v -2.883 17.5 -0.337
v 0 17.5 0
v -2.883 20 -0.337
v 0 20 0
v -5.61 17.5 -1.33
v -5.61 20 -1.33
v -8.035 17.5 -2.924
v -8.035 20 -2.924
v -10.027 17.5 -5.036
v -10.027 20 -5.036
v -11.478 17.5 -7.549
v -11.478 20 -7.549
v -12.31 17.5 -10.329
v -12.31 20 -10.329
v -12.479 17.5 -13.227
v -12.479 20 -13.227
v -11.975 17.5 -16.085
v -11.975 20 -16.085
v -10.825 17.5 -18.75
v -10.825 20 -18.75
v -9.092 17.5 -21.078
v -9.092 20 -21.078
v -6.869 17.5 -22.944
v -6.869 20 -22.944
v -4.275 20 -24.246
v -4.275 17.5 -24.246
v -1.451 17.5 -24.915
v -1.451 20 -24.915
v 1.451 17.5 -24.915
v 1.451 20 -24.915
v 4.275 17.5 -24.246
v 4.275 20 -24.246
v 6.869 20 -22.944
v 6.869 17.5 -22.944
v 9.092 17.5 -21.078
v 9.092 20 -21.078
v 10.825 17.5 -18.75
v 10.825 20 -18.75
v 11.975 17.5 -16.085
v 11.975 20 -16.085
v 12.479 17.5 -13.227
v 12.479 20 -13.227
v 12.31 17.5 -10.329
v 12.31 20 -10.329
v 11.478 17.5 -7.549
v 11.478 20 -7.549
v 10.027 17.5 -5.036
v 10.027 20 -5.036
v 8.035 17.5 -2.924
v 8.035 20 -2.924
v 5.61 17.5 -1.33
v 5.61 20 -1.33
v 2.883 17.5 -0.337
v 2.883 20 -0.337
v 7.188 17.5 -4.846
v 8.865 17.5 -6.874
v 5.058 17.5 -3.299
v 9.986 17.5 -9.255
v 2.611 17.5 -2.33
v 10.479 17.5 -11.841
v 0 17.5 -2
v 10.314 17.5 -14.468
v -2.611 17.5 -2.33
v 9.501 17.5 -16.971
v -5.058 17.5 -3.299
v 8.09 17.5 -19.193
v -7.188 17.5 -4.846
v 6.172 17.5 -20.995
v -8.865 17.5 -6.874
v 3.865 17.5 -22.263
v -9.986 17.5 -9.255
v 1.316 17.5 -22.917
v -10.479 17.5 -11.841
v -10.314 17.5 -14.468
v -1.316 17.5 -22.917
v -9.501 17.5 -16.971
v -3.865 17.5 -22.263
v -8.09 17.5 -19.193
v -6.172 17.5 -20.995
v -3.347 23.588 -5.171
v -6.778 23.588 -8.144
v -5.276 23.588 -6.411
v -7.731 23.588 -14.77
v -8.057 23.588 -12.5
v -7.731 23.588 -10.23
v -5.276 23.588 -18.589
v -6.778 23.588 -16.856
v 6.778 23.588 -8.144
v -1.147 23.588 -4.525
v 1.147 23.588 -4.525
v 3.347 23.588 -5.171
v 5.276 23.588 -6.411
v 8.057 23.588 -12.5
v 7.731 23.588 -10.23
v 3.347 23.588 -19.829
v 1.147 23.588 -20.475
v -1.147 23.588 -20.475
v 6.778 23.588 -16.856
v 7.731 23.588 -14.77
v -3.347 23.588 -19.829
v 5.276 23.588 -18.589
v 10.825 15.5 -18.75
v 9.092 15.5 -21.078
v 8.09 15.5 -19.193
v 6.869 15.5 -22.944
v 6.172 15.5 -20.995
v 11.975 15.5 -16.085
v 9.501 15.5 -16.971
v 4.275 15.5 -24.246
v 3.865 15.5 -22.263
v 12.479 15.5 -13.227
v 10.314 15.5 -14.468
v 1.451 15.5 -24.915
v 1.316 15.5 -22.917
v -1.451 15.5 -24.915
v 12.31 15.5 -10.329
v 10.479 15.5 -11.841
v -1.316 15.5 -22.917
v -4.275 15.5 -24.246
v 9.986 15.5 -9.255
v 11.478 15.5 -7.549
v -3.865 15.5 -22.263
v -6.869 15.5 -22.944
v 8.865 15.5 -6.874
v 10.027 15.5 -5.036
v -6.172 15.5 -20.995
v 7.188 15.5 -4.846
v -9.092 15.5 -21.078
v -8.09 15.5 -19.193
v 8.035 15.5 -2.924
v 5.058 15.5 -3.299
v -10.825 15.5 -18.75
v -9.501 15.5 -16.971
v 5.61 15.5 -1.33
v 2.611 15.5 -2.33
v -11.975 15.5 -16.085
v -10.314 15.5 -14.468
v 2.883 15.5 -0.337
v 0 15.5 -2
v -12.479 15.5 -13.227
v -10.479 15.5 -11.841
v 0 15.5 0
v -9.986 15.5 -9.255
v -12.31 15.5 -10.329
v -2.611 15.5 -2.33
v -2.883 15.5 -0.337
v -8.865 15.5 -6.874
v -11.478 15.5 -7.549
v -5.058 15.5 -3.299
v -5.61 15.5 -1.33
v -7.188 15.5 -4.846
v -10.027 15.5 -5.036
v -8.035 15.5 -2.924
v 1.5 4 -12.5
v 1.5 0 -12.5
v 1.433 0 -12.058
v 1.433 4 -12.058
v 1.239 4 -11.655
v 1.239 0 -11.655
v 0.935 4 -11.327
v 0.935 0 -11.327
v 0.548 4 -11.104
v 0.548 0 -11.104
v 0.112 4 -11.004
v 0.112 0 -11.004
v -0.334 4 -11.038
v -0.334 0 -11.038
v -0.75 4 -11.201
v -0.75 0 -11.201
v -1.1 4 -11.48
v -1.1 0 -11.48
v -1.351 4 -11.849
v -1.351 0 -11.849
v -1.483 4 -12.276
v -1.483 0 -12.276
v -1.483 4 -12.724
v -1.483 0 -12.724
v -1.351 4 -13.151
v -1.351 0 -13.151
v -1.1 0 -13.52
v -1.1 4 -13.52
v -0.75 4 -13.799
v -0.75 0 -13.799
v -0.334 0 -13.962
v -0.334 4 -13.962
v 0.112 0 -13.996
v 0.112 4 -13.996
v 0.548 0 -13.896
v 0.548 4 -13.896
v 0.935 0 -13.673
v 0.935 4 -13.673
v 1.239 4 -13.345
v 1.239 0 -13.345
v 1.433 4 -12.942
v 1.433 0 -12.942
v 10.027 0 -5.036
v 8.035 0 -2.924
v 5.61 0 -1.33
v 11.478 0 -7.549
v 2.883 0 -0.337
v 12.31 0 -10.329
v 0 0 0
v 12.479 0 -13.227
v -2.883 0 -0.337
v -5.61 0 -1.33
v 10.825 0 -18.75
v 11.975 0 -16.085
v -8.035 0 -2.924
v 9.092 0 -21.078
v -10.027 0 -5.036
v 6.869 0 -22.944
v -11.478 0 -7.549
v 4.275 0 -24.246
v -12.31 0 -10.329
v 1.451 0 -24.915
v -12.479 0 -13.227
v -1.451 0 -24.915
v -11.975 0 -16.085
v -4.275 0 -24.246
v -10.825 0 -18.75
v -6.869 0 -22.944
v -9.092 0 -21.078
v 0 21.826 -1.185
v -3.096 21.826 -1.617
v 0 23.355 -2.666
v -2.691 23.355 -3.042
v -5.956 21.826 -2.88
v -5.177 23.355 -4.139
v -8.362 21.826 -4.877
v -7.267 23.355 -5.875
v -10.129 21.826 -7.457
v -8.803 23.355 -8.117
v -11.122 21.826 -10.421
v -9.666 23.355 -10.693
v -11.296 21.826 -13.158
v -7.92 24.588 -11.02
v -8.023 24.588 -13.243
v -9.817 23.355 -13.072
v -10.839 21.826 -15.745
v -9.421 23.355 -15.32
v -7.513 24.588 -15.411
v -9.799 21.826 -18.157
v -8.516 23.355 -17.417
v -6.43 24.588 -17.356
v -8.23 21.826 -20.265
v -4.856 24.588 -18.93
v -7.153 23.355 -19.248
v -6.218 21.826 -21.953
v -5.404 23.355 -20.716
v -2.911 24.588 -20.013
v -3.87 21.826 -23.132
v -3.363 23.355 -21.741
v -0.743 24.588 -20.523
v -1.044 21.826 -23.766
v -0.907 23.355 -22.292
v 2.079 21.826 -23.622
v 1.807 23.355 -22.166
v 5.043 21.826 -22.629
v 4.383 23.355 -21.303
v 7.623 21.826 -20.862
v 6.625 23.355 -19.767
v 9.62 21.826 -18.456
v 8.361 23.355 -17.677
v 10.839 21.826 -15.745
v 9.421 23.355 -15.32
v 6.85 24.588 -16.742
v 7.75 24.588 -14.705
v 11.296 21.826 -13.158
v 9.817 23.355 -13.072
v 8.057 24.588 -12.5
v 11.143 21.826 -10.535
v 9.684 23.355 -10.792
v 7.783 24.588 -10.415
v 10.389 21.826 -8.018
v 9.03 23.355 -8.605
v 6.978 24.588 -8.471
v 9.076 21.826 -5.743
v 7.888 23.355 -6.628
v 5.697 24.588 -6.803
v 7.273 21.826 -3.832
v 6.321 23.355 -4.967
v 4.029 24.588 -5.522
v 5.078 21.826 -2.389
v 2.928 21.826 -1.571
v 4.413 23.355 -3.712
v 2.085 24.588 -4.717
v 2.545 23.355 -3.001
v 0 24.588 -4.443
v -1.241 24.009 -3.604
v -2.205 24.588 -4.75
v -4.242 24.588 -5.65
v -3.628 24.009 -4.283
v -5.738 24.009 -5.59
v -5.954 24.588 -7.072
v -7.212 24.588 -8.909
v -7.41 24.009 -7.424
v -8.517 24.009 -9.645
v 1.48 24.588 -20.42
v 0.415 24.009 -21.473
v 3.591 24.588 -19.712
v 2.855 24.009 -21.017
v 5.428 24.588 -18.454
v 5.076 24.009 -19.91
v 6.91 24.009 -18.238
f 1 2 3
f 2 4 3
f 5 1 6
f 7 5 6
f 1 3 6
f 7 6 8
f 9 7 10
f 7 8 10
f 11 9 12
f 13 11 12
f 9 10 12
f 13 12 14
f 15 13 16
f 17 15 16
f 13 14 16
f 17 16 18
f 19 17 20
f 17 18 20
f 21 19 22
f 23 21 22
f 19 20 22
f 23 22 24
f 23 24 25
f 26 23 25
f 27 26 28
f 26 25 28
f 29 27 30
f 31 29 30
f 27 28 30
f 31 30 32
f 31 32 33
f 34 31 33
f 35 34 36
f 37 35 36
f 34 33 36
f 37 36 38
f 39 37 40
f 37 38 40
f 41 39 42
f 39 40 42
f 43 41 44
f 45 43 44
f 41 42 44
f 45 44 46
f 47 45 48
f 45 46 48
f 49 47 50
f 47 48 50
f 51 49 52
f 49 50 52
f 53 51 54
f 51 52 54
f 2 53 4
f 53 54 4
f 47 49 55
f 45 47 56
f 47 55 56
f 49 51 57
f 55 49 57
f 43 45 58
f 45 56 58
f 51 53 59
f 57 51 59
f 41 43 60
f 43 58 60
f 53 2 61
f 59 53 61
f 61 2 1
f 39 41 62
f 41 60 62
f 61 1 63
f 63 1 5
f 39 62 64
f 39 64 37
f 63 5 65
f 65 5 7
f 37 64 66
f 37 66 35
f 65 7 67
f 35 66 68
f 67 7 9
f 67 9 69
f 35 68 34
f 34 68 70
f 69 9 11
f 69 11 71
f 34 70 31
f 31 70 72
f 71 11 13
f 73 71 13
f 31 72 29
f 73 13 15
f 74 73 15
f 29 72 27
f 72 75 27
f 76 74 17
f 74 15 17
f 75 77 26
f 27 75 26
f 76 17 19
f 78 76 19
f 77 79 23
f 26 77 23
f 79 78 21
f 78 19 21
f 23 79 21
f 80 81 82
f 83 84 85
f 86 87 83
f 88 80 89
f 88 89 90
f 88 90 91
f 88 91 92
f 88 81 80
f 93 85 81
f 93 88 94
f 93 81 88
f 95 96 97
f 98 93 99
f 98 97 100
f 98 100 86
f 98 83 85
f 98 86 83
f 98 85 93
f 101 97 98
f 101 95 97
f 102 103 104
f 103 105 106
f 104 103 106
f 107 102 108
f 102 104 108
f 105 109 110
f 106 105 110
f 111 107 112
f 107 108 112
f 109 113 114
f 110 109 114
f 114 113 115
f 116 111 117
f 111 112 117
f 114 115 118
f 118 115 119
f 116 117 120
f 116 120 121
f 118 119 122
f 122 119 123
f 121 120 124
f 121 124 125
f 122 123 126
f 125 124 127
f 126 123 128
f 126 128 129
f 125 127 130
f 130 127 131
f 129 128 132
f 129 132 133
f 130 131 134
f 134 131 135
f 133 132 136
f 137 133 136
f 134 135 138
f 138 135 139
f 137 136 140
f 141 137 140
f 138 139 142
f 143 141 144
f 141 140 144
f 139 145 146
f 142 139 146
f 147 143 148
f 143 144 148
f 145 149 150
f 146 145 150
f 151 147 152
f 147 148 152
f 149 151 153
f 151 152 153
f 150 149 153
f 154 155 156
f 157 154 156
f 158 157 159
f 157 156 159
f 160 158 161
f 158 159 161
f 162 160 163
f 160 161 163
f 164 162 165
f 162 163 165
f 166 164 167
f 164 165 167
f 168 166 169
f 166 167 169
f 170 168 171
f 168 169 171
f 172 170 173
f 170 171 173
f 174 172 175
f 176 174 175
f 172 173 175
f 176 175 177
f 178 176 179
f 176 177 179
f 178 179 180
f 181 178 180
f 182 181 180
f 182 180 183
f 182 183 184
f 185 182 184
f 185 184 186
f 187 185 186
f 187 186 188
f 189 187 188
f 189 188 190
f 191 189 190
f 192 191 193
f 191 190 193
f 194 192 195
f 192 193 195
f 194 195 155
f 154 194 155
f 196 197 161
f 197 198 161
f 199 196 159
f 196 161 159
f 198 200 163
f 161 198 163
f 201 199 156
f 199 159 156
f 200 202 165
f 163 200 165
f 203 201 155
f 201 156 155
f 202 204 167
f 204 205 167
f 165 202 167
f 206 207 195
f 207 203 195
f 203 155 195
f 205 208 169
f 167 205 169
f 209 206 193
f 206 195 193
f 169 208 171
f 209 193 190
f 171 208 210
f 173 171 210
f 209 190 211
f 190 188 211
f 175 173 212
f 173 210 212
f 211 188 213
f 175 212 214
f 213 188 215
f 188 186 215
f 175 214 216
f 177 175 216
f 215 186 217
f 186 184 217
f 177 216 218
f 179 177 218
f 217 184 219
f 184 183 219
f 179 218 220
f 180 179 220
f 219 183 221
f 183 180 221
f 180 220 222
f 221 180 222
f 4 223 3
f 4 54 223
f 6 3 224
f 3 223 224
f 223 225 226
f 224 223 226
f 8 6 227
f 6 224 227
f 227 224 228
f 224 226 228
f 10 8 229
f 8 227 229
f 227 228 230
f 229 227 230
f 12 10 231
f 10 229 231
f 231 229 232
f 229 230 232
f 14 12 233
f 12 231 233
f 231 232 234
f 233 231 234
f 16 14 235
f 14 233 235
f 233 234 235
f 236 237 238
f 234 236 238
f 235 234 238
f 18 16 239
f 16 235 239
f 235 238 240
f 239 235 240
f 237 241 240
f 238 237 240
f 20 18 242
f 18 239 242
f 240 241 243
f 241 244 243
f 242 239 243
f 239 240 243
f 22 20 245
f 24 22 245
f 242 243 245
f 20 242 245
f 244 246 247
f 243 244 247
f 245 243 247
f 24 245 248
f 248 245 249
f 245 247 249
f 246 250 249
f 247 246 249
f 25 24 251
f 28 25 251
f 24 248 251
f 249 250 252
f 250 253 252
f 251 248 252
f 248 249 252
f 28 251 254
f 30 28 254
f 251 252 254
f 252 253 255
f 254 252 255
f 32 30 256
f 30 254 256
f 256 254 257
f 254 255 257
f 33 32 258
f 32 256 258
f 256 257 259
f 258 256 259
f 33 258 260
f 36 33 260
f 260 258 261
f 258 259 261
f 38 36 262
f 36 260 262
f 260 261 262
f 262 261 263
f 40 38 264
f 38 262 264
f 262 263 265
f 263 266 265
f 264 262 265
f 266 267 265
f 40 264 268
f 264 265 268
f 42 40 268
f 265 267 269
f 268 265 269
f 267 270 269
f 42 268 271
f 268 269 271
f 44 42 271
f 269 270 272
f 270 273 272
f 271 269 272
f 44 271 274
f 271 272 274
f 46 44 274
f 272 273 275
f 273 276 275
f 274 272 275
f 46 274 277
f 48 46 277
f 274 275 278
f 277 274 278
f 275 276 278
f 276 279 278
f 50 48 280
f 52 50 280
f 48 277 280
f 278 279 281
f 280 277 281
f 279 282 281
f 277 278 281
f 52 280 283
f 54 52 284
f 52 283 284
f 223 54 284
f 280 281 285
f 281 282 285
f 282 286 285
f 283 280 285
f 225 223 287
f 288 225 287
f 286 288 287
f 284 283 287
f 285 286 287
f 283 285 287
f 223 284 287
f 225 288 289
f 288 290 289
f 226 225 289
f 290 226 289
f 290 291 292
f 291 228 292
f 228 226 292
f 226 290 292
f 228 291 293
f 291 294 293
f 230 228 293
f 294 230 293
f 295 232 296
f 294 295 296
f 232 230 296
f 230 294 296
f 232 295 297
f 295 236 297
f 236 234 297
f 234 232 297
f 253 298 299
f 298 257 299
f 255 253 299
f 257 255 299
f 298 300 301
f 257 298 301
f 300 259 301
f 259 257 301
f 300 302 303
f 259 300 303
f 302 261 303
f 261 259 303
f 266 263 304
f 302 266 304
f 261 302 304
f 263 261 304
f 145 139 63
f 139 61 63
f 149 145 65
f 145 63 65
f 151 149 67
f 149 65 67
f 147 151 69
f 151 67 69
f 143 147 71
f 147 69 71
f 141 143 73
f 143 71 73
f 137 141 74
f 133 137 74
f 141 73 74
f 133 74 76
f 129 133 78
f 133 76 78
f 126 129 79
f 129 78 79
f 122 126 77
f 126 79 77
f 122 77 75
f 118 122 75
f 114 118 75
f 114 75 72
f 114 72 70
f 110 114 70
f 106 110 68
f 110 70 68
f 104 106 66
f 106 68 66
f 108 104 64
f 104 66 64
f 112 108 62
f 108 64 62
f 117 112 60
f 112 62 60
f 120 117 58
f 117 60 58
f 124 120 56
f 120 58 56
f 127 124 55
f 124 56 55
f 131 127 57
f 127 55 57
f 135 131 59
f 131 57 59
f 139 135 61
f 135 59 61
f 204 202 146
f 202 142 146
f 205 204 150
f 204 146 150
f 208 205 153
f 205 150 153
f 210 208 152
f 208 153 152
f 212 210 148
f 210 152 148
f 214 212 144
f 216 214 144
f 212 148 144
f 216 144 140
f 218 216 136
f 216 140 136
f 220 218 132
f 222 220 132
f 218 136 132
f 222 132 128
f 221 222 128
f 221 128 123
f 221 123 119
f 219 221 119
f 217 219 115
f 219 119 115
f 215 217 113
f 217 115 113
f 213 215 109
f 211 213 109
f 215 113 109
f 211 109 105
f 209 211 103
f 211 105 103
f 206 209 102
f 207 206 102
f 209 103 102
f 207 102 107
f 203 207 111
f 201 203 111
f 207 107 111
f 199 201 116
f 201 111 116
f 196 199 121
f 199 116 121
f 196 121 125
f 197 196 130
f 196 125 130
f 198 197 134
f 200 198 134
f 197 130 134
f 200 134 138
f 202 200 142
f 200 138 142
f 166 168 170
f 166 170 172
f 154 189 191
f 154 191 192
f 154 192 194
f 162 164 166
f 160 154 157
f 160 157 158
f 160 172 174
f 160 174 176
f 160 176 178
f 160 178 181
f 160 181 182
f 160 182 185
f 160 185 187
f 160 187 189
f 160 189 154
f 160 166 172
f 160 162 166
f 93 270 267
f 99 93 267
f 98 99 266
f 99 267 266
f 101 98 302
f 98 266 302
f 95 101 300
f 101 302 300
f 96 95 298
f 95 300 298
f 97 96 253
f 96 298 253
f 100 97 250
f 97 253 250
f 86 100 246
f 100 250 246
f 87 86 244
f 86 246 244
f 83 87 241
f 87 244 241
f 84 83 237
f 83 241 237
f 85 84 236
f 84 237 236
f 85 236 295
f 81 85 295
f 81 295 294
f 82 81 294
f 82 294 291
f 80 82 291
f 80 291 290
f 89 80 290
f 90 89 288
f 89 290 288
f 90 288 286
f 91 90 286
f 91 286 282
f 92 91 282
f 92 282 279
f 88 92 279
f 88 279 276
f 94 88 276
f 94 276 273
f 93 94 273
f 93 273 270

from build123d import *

# Parameters (mm, degrees)
SKETCH2_R          = 1.5
CUT_EXTRUDE1_DEPTH = 4
SKETCH3_R          = 8.057142585
CUT_EXTRUDE2_DEPTH = 1


with BuildPart() as part:
    # Sketch1 → Revolve2 (revolve)
    with BuildSketch(Plane(origin=(0, 0, 0), x_dir=(0, 0, -1), z_dir=(1, 0, 0))):
        with BuildLine():
            Line((0, 0), (0, 15.5))
            Line((0, 15.5), (2, 15.5))
            Line((2, 15.5), (2, 17.5))
            Line((2, 17.5), (0, 17.5))
            Line((0, 17.5), (0, 20))
            add(Edge.make_bspline(
                [(0, 20), (1.556141404, 22.961218059), (4.442857415, 24.588216471)],
                knots=[0, 0, 0, 1, 1, 1], degree=2))
            Line((4.442857415, 24.588216471), (12.5, 24.588216471))
            Line((12.5, 24.588216471), (12.5, 0))
            Line((12.5, 0), (0, 0))
        make_face()
    revolve(axis=Axis((0, 24.588216471, -12.5), (0, -1, 0)))

    # Sketch2 → Cut-Extrude1 (cut)
    with BuildSketch(Plane.XZ):
        with Locations((0, -12.5)):
            Circle(SKETCH2_R)
    extrude(amount=-CUT_EXTRUDE1_DEPTH, mode=Mode.SUBTRACT)

    # Sketch3 → Cut-Extrude2 (cut)
    with BuildSketch(Plane(origin=(0, 24.588216471, 0), x_dir=(1, 0, 0), z_dir=(0, 1, 0))):
        with Locations((0, 12.5)):
            Circle(SKETCH3_R)
    extrude(amount=-CUT_EXTRUDE2_DEPTH, mode=Mode.SUBTRACT)


solid = part.part
